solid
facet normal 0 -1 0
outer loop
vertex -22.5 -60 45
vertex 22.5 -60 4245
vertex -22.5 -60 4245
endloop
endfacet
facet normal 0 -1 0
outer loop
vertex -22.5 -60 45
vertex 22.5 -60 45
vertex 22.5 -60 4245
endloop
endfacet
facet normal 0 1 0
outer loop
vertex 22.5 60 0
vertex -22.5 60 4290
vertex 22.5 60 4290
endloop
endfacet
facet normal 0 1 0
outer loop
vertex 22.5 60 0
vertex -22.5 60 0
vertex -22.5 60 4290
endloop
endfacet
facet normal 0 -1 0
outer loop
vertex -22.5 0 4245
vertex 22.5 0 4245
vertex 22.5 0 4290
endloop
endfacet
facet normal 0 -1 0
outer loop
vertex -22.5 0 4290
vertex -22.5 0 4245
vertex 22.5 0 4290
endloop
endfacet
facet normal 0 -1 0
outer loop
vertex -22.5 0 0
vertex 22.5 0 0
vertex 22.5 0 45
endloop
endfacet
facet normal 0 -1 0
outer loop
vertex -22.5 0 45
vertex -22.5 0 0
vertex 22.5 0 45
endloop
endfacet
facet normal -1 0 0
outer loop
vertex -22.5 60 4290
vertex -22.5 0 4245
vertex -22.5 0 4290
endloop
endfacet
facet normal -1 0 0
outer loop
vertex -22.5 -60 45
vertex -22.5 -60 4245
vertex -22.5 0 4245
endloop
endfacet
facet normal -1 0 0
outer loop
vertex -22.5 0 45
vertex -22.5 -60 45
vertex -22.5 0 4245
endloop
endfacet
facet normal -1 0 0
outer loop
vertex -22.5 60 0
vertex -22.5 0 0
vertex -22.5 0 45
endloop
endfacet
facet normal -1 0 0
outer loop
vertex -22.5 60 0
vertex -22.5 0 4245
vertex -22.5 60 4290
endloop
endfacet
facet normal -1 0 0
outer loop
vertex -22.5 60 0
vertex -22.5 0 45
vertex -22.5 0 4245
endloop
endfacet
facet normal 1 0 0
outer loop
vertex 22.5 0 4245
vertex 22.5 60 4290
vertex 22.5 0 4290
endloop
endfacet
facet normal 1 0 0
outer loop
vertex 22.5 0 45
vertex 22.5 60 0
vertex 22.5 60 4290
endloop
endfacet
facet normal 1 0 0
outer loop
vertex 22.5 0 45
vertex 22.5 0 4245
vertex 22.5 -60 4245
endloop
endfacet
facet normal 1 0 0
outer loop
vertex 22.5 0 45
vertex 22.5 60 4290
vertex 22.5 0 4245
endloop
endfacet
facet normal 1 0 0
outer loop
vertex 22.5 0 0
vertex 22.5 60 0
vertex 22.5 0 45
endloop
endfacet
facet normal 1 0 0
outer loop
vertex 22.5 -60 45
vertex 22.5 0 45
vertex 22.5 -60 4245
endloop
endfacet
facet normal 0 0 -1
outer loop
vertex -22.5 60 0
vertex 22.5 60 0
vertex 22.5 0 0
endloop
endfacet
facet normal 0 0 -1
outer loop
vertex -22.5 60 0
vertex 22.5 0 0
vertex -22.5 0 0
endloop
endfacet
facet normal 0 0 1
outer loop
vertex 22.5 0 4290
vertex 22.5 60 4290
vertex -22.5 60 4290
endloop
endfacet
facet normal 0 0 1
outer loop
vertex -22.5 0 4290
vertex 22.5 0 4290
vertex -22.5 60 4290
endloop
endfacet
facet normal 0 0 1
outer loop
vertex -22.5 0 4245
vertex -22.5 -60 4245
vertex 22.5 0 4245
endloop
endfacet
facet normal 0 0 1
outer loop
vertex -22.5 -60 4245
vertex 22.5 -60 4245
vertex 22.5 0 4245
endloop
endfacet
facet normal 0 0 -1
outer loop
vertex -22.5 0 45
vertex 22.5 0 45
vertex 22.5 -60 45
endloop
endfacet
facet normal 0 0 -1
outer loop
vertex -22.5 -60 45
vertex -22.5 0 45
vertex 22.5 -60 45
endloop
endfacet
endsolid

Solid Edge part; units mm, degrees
sketch "Sketch1" plane through (0, 0, 0) normal (0, 0, -1) x (-1, 0, 0)
  line L0 (-22.5, -60) -> (22.5, -60)
  line L1 (22.5, -60) -> (22.5, 60)
  line L2 (22.5, 60) -> (-22.5, 60)
  line L3 (-22.5, 60) -> (-22.5, -60)
extrude "Protrusion1" add sketch "Sketch1" against normal blind 4290
sketch "Sketch2" plane through (22.5, 0, 2145) normal (1, 0, 0) x (0, 0, 1)
  line L0 (2145, 60) -> (2100, 60)
  line L1 (2100, 60) -> (2100, 0)
  line L2 (2100, 0) -> (2145, 0)
  line L3 (2145, 0) -> (2145, 60)
extrude "ExtrudedCutout_1" cut sketch "Sketch2" against normal blind 786.4437
sketch "Sketch3" plane through (22.5, 0, 2145) normal (1, 0, 0) x (0, 0, 1)
  line L0 (-2145, 0) -> (-2100, 0)
  line L1 (-2100, 0) -> (-2100, 60)
  line L2 (-2100, 60) -> (-2145, 60)
  line L3 (-2145, 60) -> (-2145, 0)
extrude "ExtrudedCutout_3" cut sketch "Sketch3" against normal blind 255.3017
properties material "Wood, Pine"
